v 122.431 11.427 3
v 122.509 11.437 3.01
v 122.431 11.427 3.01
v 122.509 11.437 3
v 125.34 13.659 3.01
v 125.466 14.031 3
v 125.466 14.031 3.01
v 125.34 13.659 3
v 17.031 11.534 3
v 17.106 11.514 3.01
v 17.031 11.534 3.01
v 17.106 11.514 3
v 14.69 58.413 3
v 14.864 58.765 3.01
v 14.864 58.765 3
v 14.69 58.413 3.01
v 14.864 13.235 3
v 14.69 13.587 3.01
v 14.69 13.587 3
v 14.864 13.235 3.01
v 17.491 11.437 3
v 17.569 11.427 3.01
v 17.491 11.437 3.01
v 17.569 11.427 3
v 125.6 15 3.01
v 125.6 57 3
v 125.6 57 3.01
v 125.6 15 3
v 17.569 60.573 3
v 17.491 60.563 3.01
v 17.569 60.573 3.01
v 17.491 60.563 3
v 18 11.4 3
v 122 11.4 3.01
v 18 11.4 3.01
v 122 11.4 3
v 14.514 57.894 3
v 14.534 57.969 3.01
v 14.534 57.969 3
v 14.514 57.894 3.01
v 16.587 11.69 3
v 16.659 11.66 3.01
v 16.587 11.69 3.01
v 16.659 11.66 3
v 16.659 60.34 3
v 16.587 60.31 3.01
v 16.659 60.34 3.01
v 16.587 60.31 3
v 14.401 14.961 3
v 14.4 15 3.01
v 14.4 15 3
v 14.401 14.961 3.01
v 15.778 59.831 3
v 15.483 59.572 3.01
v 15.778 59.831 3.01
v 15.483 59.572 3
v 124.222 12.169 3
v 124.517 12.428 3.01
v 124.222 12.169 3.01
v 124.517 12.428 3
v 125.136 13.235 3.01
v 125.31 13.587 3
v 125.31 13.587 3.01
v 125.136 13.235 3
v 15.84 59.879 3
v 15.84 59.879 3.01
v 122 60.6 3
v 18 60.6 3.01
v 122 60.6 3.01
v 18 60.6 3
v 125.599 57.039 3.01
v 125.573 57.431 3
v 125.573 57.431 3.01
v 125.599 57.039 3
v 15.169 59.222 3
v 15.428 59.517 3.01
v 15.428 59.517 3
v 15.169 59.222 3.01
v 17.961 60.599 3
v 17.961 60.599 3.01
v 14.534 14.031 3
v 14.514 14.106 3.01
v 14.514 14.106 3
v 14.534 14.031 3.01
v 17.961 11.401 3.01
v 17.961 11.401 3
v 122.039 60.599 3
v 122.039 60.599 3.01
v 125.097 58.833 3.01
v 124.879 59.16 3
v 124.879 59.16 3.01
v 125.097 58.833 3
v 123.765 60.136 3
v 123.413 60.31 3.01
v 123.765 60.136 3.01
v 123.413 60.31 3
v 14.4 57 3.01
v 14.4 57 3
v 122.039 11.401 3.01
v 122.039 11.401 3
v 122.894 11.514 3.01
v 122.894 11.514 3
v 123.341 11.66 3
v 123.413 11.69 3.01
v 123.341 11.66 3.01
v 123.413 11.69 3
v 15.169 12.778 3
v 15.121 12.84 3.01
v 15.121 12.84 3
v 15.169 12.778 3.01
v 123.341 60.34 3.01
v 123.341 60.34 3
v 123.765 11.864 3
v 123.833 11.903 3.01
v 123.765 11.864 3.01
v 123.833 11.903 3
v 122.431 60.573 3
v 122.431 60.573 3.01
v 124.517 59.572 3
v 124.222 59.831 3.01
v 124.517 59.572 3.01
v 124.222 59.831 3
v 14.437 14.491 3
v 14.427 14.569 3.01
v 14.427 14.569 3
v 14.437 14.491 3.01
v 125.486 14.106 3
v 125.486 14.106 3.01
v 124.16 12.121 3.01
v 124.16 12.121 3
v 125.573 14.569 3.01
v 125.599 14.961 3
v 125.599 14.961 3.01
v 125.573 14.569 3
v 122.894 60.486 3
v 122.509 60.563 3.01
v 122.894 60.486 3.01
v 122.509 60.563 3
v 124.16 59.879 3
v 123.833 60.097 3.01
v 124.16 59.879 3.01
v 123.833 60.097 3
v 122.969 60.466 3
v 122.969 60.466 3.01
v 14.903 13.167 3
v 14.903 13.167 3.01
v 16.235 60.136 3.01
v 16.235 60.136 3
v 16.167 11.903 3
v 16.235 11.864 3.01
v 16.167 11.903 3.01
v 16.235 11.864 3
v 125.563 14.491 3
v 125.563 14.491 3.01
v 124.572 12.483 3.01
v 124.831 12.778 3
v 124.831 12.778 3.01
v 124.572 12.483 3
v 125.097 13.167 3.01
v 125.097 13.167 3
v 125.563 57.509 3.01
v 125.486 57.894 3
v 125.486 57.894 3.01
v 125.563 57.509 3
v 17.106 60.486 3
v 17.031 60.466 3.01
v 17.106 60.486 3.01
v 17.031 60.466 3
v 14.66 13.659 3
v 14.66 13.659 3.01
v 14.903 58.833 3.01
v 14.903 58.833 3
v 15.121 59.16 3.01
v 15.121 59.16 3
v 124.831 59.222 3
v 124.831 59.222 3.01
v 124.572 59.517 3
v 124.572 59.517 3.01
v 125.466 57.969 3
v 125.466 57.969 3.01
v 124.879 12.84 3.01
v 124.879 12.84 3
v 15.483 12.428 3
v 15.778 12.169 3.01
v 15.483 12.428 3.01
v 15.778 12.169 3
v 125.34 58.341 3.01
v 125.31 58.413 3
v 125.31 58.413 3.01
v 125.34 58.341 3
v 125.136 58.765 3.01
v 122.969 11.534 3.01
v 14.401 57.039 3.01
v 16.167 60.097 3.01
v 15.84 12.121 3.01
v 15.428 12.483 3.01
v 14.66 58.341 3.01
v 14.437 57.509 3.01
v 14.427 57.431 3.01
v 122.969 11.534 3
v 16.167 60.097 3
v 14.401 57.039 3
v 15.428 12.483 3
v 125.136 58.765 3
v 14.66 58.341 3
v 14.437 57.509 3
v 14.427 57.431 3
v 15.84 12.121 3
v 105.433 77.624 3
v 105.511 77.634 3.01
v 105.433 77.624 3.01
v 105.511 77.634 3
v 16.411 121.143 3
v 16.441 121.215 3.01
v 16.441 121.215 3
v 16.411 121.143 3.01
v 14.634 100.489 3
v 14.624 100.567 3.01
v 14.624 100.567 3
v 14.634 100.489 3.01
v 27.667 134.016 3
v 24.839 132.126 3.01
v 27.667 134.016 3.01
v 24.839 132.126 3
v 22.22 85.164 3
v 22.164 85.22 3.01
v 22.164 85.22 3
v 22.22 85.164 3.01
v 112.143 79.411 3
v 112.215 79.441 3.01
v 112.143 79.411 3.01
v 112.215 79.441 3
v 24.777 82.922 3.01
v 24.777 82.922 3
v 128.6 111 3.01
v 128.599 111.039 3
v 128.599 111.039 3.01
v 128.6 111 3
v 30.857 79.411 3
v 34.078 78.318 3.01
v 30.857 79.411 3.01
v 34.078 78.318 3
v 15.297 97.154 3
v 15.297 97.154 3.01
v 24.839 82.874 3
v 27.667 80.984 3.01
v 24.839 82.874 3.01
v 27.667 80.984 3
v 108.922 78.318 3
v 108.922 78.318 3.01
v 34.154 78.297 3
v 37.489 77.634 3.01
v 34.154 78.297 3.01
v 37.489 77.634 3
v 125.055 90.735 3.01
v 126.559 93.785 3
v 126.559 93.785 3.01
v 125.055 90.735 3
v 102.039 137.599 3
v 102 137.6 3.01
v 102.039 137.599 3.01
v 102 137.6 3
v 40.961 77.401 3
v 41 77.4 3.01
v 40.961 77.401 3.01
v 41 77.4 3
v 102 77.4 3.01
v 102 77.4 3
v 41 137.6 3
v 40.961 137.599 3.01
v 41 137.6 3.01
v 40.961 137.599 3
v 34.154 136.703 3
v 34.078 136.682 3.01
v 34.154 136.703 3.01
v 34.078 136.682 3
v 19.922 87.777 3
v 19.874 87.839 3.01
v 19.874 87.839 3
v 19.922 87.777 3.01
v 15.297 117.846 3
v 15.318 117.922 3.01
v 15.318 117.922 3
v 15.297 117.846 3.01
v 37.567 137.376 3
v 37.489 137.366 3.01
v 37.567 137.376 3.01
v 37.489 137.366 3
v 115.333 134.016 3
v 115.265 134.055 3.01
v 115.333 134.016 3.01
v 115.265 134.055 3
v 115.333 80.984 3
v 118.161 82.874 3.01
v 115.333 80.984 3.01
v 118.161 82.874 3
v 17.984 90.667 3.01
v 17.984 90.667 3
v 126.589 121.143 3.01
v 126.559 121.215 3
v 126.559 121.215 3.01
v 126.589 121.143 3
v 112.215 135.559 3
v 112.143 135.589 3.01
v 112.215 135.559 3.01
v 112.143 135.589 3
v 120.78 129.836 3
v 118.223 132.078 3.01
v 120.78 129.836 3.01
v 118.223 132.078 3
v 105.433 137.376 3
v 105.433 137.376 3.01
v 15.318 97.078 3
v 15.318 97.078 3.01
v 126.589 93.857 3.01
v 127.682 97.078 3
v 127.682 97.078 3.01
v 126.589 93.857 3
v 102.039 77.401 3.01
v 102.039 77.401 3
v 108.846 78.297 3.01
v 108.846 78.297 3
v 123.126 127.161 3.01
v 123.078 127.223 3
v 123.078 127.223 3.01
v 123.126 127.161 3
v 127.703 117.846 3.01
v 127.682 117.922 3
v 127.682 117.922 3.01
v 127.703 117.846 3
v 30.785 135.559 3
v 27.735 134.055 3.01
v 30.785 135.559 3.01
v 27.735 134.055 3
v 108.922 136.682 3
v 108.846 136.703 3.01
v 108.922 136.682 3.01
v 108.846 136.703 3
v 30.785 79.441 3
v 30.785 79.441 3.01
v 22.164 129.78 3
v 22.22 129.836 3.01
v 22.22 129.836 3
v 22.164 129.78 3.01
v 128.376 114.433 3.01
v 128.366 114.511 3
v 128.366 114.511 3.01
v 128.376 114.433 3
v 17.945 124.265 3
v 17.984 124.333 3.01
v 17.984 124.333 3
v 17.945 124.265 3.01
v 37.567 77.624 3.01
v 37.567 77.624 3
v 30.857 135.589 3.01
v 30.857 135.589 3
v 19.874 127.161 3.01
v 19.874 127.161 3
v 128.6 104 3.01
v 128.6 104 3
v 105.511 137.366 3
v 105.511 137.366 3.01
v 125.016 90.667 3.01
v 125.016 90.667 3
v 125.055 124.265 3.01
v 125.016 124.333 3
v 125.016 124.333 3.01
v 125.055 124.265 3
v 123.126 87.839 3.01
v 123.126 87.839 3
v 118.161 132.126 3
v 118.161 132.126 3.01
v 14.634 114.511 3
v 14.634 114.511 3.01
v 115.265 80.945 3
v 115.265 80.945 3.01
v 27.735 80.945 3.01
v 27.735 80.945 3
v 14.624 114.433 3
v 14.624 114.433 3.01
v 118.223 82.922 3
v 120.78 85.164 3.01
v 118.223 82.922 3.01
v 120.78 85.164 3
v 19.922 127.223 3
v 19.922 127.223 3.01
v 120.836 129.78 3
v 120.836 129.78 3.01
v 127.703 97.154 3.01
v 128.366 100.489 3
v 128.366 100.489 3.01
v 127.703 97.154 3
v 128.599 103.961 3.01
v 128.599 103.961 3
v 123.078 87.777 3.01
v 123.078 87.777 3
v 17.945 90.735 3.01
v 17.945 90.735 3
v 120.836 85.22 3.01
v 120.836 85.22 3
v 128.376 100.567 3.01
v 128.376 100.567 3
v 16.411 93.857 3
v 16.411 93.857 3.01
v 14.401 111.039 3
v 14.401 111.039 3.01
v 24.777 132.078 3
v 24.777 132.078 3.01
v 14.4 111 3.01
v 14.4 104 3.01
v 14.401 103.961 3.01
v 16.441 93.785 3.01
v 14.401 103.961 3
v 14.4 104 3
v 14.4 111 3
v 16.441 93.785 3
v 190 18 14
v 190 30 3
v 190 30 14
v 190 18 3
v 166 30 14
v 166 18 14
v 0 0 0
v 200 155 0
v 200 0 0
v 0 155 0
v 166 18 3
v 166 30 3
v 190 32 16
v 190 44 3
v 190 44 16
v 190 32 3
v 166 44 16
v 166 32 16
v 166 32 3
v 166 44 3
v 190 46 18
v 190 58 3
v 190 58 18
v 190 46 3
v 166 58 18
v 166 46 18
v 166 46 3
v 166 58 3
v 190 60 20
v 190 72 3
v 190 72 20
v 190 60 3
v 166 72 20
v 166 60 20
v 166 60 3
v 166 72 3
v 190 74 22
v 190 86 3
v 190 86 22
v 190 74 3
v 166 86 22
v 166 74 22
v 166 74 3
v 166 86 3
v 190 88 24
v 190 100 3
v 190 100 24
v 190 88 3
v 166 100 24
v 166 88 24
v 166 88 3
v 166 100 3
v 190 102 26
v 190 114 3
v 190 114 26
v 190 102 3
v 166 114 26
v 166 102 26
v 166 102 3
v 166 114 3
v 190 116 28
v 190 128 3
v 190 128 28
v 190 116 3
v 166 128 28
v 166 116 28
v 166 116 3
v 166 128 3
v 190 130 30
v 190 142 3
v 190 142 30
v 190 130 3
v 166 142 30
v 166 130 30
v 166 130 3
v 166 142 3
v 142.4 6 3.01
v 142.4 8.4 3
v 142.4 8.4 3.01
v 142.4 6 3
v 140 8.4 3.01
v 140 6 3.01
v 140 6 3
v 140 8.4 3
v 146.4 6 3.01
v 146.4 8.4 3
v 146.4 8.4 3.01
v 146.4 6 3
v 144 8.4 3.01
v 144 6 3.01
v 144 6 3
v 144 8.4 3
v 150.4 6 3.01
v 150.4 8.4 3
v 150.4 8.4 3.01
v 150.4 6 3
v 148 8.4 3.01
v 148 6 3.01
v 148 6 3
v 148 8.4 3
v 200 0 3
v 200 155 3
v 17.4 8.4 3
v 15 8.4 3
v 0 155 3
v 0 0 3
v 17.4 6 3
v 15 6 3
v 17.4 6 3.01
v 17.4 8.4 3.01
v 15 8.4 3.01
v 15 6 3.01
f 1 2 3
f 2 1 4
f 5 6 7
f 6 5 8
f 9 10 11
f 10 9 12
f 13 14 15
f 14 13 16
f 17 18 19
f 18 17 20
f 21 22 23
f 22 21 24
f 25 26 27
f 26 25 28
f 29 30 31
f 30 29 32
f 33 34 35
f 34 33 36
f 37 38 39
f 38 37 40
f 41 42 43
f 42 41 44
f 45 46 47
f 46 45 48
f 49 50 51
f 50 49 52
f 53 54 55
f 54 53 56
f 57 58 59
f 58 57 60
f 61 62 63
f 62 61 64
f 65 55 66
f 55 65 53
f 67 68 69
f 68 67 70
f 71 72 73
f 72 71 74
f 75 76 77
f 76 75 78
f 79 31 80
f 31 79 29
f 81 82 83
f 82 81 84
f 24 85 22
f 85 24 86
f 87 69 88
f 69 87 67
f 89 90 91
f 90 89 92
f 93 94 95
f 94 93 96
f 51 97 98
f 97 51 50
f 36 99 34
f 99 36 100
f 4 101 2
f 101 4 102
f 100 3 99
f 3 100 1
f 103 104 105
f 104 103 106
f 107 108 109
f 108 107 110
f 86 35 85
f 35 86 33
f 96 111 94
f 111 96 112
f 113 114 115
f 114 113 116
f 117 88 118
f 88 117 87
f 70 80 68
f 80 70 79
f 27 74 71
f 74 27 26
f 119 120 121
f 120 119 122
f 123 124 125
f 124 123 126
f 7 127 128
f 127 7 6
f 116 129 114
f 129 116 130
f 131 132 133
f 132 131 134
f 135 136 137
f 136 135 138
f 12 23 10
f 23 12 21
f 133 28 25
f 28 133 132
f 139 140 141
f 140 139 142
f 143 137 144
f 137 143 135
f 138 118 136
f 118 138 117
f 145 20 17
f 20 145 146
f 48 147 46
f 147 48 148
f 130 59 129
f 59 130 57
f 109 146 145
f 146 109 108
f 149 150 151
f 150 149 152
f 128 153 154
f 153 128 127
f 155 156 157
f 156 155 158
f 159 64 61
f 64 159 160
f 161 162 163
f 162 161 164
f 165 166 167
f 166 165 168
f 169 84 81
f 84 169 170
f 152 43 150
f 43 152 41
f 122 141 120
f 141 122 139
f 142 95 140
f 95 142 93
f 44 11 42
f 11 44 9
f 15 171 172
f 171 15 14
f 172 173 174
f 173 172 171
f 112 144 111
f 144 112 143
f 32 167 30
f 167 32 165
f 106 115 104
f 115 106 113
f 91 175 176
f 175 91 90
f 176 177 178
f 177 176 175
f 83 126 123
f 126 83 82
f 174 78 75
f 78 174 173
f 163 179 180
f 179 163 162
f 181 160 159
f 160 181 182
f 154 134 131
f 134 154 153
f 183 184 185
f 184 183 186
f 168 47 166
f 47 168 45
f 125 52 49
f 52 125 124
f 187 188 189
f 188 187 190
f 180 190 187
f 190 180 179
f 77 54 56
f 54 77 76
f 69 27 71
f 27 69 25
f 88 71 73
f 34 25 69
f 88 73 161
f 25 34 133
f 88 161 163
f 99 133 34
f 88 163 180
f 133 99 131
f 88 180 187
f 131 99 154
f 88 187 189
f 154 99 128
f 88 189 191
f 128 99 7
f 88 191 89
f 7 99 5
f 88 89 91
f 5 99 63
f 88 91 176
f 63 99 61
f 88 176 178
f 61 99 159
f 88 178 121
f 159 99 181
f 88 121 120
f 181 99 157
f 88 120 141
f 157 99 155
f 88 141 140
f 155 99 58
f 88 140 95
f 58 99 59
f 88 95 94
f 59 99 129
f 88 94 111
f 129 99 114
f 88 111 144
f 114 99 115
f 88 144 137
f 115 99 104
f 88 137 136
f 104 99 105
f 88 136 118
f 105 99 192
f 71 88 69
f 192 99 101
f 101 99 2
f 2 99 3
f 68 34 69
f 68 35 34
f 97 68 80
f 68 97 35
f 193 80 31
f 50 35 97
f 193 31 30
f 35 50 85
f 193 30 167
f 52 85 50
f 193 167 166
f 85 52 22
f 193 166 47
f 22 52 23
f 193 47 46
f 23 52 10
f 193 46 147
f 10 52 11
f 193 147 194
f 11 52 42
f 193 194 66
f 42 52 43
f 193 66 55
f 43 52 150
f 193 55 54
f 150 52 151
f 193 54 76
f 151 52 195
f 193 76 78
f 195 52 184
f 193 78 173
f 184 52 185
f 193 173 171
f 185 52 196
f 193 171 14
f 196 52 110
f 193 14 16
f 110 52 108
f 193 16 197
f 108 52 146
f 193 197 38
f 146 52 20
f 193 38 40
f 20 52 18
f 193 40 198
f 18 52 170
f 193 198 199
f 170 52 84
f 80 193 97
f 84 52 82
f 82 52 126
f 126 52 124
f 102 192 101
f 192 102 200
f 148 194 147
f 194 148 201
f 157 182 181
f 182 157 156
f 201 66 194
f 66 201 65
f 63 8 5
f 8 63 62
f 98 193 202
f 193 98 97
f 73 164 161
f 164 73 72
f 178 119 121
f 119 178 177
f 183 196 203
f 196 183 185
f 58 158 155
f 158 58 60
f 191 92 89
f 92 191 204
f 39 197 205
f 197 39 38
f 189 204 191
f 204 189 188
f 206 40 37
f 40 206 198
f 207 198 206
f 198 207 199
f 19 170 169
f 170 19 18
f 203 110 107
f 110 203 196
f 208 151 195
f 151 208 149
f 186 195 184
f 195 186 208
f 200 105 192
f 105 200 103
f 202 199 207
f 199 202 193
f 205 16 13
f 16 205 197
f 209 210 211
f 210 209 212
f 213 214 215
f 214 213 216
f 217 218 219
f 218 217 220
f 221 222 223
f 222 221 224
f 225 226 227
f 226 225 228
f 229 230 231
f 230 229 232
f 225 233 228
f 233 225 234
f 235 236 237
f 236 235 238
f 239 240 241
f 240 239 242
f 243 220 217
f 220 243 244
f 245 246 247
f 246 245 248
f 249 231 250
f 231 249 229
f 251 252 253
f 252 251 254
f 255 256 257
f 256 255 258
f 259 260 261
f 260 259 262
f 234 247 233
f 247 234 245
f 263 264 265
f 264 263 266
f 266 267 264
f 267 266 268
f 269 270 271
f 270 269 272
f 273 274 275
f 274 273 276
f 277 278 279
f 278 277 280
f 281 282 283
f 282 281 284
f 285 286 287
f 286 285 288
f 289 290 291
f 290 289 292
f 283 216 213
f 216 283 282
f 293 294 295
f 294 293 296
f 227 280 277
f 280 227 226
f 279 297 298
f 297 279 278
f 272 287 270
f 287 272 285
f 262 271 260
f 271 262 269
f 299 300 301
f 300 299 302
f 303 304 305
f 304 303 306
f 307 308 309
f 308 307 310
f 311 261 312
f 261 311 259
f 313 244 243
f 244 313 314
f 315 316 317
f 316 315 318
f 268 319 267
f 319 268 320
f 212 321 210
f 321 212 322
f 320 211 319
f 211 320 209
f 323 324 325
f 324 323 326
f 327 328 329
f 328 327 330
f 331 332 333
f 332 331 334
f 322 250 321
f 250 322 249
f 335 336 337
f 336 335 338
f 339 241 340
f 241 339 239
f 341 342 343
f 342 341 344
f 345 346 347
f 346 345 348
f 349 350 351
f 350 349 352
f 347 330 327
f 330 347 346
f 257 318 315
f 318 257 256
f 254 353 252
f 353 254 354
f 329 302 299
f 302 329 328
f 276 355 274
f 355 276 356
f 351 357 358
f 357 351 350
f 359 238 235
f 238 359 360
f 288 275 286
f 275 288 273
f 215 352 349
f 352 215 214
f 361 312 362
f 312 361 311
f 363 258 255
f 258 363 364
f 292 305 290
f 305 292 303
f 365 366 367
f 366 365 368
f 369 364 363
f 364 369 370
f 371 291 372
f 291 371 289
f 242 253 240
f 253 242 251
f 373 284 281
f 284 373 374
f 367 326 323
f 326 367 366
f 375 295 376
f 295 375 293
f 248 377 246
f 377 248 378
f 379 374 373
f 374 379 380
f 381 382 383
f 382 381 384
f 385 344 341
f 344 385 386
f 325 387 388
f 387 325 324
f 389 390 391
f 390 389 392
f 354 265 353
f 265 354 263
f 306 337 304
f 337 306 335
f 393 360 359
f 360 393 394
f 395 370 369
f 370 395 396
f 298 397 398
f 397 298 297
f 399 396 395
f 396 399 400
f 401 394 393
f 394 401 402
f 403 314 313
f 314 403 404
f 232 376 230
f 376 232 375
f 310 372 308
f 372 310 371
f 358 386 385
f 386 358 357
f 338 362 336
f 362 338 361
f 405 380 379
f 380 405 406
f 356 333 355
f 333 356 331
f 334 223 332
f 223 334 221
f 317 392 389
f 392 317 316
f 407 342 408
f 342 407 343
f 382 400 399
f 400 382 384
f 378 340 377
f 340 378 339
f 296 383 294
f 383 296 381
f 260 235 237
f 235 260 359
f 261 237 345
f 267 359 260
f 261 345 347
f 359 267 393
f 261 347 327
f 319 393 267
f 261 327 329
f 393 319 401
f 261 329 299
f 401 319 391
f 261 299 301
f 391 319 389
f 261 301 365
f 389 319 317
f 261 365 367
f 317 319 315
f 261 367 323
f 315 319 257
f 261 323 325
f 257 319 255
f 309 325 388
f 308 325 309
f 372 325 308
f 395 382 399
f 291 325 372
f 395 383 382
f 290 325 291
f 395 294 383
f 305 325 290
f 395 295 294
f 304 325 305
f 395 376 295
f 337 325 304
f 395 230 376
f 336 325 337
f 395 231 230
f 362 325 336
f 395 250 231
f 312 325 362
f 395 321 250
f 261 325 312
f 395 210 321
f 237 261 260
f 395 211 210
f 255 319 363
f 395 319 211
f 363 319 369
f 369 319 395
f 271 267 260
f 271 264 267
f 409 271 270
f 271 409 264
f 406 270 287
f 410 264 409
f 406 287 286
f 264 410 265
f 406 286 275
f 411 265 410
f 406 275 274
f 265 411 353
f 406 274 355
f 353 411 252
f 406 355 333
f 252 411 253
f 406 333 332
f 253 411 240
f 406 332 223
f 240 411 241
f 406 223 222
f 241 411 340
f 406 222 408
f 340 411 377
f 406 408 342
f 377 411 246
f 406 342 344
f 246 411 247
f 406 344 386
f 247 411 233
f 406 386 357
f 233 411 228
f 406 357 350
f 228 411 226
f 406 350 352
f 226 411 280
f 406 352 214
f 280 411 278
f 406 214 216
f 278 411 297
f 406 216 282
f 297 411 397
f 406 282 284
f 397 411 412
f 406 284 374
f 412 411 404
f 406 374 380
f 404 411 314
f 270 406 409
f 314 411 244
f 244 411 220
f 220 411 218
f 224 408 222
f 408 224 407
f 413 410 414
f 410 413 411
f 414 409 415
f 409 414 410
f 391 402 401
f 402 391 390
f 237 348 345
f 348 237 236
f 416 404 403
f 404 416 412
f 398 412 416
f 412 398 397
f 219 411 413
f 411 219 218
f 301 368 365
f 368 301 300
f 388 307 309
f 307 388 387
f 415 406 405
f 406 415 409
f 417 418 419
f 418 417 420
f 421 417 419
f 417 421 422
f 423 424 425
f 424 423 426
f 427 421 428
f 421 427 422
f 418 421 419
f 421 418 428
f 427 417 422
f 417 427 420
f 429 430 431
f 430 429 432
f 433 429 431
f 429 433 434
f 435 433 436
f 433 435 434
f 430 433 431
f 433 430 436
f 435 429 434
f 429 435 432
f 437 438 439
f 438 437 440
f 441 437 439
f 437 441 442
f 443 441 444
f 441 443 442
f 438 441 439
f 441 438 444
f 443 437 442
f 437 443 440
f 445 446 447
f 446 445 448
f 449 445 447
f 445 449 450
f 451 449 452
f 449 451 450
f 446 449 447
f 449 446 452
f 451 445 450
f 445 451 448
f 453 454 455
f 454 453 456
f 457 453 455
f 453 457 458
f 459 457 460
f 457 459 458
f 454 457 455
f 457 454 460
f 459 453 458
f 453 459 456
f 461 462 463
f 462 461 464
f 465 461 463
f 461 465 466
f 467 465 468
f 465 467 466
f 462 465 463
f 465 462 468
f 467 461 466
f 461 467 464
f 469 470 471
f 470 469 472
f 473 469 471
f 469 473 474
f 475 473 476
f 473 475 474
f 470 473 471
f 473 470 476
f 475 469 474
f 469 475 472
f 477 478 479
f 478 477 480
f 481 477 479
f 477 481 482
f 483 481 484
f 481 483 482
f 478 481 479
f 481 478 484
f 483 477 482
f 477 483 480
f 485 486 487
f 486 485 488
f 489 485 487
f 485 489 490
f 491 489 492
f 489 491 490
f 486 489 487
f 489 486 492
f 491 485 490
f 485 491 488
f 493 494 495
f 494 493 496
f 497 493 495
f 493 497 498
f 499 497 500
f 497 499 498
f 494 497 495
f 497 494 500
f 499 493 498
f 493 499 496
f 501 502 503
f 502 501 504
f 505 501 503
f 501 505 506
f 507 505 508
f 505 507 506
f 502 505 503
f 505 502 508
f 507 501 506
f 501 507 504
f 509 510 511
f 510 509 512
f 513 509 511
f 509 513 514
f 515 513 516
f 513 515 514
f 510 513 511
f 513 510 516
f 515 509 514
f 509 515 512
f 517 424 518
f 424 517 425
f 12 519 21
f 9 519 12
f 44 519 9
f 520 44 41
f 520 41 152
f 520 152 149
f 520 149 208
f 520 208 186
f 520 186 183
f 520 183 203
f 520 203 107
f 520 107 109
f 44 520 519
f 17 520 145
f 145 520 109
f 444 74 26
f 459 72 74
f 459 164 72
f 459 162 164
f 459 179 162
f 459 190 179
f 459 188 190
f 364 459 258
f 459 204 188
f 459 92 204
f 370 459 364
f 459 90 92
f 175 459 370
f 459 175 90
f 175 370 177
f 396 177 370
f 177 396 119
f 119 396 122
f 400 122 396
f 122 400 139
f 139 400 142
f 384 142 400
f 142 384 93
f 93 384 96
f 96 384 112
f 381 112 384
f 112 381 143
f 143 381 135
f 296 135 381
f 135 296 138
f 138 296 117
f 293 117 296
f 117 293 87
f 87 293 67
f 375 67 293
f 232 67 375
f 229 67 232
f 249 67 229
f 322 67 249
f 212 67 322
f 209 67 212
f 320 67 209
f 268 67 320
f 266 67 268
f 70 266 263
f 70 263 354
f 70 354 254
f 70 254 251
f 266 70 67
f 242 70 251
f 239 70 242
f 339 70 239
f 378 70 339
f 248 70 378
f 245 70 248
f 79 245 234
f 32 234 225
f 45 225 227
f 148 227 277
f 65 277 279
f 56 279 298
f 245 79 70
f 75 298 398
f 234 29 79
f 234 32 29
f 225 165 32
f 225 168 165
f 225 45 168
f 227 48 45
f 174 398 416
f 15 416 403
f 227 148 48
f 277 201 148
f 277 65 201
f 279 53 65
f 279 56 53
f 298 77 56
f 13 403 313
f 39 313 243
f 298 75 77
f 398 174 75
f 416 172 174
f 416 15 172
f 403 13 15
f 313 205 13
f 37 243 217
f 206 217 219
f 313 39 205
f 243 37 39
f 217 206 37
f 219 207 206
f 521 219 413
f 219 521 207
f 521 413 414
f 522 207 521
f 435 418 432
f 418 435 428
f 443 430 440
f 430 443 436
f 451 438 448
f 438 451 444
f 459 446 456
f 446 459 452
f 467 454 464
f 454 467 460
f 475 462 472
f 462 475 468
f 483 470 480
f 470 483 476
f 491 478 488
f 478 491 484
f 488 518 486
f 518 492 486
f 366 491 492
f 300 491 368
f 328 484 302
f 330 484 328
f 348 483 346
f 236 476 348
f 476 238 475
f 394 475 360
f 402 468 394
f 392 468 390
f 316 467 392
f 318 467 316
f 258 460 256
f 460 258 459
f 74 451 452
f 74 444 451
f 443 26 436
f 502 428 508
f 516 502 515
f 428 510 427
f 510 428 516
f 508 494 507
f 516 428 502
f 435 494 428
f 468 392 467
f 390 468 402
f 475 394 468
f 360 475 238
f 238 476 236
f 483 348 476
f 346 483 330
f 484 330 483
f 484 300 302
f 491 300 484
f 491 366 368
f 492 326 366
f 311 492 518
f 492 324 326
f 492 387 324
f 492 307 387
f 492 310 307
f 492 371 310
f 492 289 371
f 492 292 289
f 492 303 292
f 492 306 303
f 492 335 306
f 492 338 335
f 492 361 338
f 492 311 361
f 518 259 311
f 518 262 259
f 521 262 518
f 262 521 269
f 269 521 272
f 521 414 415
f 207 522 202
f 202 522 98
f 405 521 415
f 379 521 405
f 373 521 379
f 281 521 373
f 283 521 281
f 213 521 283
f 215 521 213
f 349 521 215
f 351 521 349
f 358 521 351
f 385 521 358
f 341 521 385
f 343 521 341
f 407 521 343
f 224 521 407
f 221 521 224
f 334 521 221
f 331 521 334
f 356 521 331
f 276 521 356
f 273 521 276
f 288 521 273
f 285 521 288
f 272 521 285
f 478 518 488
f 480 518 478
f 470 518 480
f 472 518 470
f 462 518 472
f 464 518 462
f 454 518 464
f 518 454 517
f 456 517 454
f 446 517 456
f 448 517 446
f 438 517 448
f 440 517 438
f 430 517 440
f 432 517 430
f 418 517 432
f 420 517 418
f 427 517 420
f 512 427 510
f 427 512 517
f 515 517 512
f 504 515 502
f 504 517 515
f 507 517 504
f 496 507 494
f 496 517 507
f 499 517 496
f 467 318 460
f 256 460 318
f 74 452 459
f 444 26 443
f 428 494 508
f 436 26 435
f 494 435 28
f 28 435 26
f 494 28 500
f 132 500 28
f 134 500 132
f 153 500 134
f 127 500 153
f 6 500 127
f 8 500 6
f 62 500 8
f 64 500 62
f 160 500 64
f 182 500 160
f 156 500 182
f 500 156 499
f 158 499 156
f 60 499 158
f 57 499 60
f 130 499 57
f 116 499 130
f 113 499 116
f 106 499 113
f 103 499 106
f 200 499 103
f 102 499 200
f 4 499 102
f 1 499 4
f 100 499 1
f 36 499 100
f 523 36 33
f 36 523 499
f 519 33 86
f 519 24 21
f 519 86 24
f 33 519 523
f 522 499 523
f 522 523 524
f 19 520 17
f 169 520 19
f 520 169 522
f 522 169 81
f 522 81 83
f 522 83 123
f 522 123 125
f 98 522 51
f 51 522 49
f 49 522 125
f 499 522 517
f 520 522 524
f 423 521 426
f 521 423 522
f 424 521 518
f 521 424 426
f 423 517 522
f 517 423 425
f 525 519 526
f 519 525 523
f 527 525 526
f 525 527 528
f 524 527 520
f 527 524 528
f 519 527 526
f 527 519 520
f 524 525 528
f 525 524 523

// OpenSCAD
// Jig 25 — HEPA cartridge PLAN-READER plate (two halves) + height stair
// =====================================================================
// BOM anchor (verbatim, upstream e840b55 "Sourced vacuum HEPA filters"):
//   "~20 kPa ~110 x 48 x 22mm"    -> x50   (Dreame X50-class family)
//   "~20 kPa ~113 x 59 x 12 mm"   -> saros (Roborock Saros-class family)
//   "~35 kPa ~102/85 x 49 x 26mm" -> x60   (Dreame X60-class family)
//
// READINGS (protocol in PRINT-TEST.md Jig 25):
//   R1 plan: seat each filter in its 1.6 mm-deep outline groove; flash fit
//      = outline确认. x60 row has BOTH candidate readings side by side:
//      right-trapezoid (102/85) and notched-rect (102 with 17x40 step) [E].
//   R2 media-window: with the filter seated dirty-side up, the recessed
//      pin grid (1.2 mm pins, 10 mm x-pitch, two rows) gives absolute
//      pocket coordinates in a top-photo -> keys window_* in the model
//      and records whether the clean face is blank or open  [E, caliper].
//   R3 height: stair 10..26 x 2 mm; BOM landings marked 12(saros) 22(x50)
//      26(x60) — h the filter against the step, read with a straightedge.
//   Corner radius: caliper the physical corner against the r3 pocket
//      corner (MEASURE-ME s23 row 8); no second radius guesswork here.
//
// Print flat, PLA, 0.2 mm, 3 walls, no supports. Two halves for a 220 mm bed:
//   openscad -o jig25_half1.stl jig25-filter-id-gauge.scad -D 'half="h1"'
//   half = "h1" | "h2"

base_t = 3.0;
groove_d = 1.6;
pin_h = 1.2;
clr = 0.6;      // groove clearance around the nominal envelope [E 0.4..0.8]

// BOM [B] envelopes
x50 = [110, 48, 22];
saros = [113, 59, 12];
x60a = 102; x60b = 85; x60w = 49; x60h = 26;

$fn = 48; eps = 0.01;
half = "h1";
x60_plan = "trap";      // which candidate is CUT on h2 (re-render for other)
x60_notch_run = 40;     // [E]
step_lo = 10; step_hi = 26; step = 2;

module rrect2d(l, w, r) { offset(r = r) offset(delta = -r) square([l, w]); }
module trap2d(l1, l2, w) { polygon([[0, 0], [l1, 0], [l2, w], [0, w]]); }
module notch2d(l1, l2, w) {
    // corner step: right end keeps full length only on a 17 mm band
    // (17 = l1-l2 along Y, run = x60_notch_run along X) [E — caliper first]
    difference() { square([l1, w]); translate([l1 - x60_notch_run, w]) mirror([0, 1]) square([x60_notch_run, l1 - l2]); }
}
module x60shape2d() { if (x60_plan == "trap") trap2d(x60a, x60b, x60w); else notch2d(x60a, x60b, x60w); }

module groove_at(x, y, l, w) {
    echo(str("[jig25] groove at ", x, ",", y, " len ", l, " wid ", w));
    translate([x, y, base_t - groove_d])
        linear_extrude(height = groove_d + eps) union() {
            offset(clr) children();
        }
    // pin grid on the groove floor, absolute coords = pocket corner + 8,10..
    translate([x + 8, y + 10, base_t - groove_d])
        for (iy = [0, 1]) for (ix = [0 : floor((l - 16)/10)])
            translate([ix*10, iy*(w - 20), 0]) cylinder(d = 1.6, h = pin_h + 0.01);
}

module height_stair(x, y) {
    union() for (i = [0 : (step_hi - step_lo)/step])
        translate([x + 6, y + 6 + i*14, 0])
            cube([24, 12, step_lo + i*step + 4]);   // +4 base pad each
    echo(str("[jig25] stair ", step_lo, "..", step_hi, " step ", step));
}

// tick labels (1..3 squares, 0.8 deep) — count = pocket id, kept simple
module ticks(x, y, n) {
    translate([x, y, base_t - 0.8])
        for (i = [0 : n-1]) translate([i*4, 0, 0]) cube([2.4, 2.4, 0.81]);
}

module plate(w, d) difference() { cube([w, d, base_t]); }

if (half == "h1") {
    difference() { plate(200, 155); }                    %plate(200, 155);
    groove_at(15, 12, x50[0], x50[1]) rrect2d(x50[0], x50[1], 3);
    groove_at(15, 12 + x50[1] + 18, saros[0], saros[1]) rrect2d(saros[0], saros[1], 26);  // (r est)
    height_stair(160, 12);
    ticks(15, 6, 1); ticks(140, 6, 3);
} else if (half == "h2") {
    %plate(150, 130);
    groove_at(15, 15, x60a, x60w) x60shape2d();
    ticks(15, 8, 3);
    echo("[jig25] h2 shows the CUT x60 candidate; re-render with -D x60_plan to cut the other");
} else echo("half = h1 | h2");
